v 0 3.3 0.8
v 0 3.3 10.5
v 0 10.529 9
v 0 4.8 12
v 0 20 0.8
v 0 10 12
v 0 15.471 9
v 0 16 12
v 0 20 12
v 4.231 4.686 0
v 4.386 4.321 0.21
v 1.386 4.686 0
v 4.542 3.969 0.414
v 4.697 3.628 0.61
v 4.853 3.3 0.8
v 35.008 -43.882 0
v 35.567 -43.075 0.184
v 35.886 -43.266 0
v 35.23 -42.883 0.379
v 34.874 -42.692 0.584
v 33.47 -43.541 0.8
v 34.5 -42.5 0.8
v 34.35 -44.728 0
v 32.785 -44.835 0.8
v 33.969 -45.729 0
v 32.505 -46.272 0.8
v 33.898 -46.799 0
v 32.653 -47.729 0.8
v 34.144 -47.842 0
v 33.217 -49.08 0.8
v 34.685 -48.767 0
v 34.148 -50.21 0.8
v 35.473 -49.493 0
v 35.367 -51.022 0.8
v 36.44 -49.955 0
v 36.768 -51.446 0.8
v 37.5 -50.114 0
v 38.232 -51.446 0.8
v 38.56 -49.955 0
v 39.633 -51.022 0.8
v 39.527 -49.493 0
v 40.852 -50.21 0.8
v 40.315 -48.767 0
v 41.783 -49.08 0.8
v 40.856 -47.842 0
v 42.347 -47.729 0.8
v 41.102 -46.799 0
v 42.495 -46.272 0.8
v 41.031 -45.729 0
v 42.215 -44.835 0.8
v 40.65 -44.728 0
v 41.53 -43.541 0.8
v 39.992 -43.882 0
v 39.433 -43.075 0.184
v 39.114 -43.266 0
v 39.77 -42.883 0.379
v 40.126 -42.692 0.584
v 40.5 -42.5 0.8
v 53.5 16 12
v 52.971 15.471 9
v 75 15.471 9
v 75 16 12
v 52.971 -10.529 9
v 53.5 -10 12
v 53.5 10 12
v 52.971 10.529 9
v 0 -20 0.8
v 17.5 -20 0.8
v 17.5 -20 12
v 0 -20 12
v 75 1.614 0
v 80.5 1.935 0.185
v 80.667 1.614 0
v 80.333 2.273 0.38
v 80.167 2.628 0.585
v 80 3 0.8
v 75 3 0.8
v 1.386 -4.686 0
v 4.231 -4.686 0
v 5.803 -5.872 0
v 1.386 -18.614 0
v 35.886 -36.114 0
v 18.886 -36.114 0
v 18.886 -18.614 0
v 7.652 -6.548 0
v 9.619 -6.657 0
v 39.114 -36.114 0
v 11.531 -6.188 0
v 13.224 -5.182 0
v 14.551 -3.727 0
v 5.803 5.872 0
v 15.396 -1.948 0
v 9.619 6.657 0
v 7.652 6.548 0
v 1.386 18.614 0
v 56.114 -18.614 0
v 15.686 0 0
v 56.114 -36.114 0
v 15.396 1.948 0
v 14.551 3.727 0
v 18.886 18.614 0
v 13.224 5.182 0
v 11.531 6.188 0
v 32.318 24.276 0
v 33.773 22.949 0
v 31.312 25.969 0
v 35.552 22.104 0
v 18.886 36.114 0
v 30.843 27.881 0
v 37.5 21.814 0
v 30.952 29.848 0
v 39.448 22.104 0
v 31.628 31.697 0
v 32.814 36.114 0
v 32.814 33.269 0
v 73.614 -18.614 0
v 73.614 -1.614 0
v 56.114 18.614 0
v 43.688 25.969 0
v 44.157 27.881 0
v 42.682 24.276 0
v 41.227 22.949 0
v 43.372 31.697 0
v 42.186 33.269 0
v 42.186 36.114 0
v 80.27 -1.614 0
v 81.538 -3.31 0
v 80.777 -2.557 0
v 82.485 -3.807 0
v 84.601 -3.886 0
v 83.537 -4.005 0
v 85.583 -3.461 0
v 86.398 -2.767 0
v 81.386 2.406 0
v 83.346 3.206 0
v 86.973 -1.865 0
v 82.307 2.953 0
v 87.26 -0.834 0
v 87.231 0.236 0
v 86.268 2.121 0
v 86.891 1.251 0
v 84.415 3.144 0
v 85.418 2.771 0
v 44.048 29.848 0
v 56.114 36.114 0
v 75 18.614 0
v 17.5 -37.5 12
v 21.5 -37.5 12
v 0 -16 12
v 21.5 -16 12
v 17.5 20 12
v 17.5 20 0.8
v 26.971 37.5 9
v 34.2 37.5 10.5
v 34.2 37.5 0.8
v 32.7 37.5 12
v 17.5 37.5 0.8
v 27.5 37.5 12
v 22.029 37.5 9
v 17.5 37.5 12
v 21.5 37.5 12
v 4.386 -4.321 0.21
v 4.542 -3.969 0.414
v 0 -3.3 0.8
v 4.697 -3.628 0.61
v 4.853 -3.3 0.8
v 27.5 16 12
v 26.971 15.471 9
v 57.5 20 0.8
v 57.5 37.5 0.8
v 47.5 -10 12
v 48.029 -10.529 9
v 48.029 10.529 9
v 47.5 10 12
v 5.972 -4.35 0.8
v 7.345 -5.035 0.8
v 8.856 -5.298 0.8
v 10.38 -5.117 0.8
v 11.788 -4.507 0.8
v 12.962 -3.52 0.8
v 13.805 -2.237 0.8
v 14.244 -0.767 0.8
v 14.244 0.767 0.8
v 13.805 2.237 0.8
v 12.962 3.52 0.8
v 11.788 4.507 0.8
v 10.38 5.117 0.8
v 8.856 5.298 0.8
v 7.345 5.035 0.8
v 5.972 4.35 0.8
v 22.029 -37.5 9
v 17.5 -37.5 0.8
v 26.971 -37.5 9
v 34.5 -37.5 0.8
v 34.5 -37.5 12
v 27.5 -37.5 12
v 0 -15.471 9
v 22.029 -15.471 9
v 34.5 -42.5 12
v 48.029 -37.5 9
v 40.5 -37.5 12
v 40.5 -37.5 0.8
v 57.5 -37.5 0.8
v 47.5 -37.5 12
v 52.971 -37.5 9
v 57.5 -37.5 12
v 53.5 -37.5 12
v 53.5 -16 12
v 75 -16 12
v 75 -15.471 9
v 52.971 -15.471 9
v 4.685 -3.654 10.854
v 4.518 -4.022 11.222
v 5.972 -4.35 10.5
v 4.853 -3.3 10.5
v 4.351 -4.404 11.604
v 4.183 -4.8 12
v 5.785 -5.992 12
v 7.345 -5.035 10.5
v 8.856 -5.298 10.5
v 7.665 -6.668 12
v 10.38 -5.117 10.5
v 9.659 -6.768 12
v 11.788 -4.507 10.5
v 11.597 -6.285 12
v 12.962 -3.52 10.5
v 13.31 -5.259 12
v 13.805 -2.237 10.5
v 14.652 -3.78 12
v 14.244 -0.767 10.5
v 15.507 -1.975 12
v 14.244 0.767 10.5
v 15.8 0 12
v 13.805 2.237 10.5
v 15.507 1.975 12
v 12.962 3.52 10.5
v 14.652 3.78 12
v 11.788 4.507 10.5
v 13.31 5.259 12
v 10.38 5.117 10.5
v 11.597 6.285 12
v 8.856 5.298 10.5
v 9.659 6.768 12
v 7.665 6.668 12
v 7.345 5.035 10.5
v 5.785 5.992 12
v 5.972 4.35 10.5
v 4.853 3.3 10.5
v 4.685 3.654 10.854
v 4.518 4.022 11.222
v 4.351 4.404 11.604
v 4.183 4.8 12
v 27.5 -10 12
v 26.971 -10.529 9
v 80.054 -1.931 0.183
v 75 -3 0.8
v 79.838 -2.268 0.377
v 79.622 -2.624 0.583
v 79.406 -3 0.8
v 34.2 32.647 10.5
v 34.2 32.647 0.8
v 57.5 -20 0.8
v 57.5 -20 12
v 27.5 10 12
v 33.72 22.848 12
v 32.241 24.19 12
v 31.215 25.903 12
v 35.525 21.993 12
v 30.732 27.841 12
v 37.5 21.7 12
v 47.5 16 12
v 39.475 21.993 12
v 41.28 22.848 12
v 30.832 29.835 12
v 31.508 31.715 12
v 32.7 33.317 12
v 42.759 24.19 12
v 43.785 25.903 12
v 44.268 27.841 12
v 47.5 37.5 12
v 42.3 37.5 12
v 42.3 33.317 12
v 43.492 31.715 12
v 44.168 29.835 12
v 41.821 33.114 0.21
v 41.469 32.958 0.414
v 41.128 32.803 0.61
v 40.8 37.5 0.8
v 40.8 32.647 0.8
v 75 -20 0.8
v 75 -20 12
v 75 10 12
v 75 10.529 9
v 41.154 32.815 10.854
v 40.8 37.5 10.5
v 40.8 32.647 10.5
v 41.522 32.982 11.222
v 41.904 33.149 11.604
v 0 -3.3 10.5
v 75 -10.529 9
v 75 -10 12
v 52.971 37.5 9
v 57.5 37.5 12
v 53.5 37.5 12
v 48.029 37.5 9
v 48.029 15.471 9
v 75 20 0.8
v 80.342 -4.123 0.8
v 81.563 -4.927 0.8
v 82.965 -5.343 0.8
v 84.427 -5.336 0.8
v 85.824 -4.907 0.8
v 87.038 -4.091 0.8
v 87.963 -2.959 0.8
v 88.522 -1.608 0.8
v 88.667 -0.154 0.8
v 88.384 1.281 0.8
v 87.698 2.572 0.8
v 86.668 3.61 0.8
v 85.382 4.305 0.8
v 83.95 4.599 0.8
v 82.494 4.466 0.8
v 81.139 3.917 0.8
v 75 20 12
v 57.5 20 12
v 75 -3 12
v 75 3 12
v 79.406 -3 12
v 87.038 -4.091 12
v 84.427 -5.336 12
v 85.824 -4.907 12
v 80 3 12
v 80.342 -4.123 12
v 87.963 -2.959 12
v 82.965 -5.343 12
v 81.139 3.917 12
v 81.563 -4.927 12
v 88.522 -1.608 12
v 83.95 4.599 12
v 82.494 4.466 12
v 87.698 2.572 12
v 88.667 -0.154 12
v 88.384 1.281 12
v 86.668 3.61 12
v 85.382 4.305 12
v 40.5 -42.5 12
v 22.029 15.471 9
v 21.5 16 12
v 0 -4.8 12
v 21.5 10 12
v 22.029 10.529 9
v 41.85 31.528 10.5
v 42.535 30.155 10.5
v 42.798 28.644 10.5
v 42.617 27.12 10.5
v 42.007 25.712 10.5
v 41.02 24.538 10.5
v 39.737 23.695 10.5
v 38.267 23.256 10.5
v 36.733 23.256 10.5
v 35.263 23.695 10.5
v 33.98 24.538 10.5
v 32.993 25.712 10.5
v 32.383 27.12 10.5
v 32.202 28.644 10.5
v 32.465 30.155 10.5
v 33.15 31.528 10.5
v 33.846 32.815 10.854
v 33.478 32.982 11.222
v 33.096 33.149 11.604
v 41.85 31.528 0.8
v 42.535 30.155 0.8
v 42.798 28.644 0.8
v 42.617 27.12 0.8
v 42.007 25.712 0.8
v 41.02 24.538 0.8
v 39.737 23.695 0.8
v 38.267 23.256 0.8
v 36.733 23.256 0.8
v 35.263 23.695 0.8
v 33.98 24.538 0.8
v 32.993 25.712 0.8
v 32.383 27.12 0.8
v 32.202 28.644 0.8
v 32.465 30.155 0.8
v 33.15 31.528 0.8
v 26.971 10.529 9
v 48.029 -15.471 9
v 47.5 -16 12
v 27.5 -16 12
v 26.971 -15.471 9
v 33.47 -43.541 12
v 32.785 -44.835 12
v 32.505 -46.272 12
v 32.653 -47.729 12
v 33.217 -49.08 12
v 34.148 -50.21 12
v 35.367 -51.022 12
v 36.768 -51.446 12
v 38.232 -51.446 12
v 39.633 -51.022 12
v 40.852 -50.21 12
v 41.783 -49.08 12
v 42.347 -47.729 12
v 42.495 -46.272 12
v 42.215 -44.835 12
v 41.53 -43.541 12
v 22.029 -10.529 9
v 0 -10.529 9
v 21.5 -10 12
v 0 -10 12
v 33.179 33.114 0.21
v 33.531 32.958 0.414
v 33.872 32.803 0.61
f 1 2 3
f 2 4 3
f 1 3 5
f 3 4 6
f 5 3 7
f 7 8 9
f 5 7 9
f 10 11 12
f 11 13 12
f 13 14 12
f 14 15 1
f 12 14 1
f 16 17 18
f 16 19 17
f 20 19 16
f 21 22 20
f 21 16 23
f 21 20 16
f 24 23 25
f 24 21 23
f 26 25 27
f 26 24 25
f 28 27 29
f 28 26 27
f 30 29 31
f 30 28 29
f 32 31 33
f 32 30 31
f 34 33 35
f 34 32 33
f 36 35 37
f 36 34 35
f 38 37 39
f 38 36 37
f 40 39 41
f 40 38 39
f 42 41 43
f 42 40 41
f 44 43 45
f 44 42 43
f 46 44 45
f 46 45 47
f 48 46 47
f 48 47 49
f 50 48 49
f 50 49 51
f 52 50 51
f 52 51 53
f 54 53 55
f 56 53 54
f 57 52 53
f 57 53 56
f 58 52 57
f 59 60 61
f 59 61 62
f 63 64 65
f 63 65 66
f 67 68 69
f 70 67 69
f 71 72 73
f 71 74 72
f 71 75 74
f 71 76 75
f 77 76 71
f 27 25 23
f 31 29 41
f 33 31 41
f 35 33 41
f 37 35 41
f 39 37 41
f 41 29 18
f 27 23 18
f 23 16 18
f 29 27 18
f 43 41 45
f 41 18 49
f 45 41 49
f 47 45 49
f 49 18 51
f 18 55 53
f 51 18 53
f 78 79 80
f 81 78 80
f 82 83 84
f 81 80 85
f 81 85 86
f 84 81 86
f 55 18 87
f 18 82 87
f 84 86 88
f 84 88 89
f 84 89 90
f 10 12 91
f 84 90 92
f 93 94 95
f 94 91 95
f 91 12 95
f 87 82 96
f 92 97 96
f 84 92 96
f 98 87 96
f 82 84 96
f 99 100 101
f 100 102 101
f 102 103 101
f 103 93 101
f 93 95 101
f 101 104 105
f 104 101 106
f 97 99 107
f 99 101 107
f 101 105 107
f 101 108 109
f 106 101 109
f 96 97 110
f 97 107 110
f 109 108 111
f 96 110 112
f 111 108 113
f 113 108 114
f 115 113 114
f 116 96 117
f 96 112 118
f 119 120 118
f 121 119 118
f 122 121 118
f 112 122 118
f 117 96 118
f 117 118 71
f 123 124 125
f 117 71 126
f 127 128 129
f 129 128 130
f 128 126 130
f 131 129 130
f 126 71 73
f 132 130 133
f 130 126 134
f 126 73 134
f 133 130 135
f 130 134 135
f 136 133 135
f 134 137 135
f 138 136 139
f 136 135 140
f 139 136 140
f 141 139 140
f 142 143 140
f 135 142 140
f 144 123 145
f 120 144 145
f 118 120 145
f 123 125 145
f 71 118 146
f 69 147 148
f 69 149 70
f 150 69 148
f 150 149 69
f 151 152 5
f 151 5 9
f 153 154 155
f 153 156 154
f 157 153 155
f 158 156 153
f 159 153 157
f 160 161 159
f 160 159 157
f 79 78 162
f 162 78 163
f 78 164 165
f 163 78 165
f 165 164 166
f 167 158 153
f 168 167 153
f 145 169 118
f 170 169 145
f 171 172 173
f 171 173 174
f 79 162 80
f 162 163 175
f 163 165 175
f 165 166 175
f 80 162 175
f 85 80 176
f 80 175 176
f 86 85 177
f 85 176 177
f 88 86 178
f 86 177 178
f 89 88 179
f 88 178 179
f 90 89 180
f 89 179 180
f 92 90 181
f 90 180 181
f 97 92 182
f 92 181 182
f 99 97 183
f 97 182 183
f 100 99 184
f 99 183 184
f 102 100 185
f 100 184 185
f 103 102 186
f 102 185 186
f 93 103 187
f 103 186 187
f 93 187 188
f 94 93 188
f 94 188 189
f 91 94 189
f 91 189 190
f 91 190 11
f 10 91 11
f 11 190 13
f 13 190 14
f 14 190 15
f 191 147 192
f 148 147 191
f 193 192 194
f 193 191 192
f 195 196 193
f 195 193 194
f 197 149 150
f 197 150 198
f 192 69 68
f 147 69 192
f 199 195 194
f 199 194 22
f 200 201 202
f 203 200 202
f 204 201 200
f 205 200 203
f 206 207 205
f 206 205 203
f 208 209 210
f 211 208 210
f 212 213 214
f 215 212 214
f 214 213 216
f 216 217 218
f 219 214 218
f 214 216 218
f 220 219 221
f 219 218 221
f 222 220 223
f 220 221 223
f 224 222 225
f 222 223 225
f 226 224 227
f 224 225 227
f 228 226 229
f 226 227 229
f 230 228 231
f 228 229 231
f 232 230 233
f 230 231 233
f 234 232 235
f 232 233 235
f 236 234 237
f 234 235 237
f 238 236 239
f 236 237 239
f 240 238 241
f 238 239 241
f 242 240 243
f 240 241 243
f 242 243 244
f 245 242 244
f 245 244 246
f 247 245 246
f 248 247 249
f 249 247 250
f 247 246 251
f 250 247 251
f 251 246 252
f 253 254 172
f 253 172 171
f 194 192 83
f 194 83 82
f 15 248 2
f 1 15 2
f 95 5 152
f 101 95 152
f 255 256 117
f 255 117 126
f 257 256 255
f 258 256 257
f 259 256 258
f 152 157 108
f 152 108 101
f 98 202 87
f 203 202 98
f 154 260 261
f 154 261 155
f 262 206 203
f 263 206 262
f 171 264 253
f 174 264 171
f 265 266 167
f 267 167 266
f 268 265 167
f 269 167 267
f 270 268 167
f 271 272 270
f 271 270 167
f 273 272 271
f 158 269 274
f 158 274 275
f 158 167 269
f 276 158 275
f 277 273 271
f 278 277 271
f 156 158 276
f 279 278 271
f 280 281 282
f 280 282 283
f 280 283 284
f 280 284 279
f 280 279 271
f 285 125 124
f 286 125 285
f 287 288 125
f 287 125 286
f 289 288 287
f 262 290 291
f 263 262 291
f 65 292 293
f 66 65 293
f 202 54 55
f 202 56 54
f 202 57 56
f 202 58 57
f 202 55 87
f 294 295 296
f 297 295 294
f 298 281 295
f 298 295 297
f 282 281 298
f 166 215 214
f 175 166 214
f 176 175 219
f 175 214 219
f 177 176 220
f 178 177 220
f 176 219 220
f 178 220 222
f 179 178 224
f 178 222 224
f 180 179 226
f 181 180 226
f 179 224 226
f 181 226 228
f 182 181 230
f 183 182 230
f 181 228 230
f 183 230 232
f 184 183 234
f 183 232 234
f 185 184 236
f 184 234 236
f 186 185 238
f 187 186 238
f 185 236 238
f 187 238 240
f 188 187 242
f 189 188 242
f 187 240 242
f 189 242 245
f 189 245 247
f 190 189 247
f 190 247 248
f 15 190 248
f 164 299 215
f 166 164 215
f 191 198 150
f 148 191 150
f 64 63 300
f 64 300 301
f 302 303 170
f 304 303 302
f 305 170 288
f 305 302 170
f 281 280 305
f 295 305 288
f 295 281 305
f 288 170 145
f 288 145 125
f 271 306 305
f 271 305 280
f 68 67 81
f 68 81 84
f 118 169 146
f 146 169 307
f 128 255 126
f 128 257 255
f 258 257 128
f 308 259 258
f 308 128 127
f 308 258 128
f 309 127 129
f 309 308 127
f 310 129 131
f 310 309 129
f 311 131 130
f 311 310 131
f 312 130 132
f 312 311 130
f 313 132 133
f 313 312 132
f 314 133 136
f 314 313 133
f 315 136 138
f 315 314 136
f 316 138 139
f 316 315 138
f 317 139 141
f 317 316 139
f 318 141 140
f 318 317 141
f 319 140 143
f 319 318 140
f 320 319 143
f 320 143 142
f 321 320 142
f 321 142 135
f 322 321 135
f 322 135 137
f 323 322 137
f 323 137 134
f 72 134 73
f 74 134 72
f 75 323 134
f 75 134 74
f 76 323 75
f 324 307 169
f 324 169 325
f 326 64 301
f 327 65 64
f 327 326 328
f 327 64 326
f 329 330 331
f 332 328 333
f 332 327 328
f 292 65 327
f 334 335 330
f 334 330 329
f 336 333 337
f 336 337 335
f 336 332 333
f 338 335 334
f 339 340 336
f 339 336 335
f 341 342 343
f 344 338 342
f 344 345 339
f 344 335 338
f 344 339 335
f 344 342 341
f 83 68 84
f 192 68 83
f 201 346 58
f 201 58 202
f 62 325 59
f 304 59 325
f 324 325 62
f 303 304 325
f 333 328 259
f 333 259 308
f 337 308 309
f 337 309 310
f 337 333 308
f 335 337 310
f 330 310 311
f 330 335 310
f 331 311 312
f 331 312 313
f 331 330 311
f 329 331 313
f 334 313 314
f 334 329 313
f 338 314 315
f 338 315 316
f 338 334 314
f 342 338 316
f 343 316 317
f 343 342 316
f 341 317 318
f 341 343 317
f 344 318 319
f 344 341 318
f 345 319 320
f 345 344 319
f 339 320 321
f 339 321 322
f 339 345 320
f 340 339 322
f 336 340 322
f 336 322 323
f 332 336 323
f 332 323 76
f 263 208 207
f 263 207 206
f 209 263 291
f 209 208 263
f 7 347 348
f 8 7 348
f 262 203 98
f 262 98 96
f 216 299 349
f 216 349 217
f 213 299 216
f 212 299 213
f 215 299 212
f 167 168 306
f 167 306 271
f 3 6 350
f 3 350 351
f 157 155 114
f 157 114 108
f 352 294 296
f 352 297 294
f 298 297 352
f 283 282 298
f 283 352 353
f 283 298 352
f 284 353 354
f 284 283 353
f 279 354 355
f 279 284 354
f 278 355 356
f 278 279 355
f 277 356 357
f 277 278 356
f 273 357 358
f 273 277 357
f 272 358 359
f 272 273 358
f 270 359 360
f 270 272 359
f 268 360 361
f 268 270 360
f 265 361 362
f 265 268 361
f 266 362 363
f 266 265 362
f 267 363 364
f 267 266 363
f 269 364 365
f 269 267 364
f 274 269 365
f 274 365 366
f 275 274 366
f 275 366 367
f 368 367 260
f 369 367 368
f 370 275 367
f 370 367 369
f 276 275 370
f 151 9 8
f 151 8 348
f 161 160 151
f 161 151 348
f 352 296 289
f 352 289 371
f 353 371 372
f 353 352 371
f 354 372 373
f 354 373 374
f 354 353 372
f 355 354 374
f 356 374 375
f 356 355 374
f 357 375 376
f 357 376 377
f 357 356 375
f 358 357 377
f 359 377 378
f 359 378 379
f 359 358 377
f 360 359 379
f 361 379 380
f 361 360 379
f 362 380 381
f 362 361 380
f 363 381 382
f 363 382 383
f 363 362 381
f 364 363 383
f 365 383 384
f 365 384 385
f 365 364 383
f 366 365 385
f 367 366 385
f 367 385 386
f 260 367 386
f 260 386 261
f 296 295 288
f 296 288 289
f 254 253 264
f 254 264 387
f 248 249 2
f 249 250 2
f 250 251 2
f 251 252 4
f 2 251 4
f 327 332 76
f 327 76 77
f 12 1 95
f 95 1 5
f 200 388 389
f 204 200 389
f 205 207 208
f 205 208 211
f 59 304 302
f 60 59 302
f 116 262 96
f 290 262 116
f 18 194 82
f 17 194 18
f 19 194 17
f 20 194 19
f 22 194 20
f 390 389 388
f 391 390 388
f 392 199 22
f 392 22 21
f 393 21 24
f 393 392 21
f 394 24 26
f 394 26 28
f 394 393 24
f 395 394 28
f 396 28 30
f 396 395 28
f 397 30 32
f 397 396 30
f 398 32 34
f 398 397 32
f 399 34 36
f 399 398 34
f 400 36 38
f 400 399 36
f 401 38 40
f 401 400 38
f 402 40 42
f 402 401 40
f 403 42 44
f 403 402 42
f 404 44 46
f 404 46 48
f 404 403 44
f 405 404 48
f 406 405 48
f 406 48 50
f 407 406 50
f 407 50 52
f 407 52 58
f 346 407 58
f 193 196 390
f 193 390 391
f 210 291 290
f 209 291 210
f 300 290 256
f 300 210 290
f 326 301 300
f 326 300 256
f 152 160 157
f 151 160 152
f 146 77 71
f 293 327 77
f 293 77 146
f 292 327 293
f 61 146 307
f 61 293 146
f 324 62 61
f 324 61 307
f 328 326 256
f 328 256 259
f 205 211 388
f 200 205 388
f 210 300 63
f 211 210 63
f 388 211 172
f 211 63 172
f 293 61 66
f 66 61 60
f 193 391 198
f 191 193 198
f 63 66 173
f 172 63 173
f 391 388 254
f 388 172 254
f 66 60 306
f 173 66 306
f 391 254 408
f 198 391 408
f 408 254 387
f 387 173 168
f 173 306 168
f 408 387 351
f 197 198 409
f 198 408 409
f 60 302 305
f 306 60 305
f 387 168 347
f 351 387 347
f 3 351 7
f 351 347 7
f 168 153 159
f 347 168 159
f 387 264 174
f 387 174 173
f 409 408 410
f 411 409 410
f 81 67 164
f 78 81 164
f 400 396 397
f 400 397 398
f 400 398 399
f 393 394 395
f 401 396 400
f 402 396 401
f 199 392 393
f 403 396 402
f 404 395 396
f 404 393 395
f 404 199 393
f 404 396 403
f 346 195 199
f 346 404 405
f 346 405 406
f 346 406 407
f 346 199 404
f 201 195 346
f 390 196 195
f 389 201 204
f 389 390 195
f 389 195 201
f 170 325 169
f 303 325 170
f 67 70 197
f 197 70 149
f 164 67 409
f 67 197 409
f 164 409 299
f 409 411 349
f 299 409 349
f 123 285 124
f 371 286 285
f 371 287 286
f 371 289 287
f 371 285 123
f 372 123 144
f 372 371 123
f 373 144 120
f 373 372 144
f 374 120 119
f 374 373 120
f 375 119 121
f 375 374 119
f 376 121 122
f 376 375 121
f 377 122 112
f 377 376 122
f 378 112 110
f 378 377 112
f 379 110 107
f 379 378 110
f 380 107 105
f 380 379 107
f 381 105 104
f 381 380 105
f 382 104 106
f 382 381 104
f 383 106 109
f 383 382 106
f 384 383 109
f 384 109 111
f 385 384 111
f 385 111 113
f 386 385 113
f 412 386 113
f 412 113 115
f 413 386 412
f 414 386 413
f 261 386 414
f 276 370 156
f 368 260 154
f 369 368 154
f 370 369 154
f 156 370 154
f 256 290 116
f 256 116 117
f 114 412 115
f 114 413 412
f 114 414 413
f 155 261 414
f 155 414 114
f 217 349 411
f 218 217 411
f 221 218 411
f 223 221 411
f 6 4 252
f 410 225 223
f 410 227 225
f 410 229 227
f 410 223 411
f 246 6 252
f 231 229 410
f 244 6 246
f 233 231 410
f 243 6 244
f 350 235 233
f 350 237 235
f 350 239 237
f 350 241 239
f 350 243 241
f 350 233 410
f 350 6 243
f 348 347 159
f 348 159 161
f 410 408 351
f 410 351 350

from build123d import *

# Parameters (mm, degrees)
F0_W      = 40
F0_H      = 12
F1_DEPTH  = 75
F3_DEPTH  = 12
F5_DEPTH  = 12
F7_DEPTH  = 75
F9_DEPTH  = 75
F10_SIZE2 = 0.8
F10_SIZE  = 1.3856406461
F11_SIZE  = 1.5


with BuildPart() as f1:
    # F0 (on Right) → F1 (new body)
    with BuildSketch(Plane.YZ):
        with Locations((0, 6)):
            Rectangle(F0_W, F0_H)
    extrude(amount=F1_DEPTH)

    # F2 (on face) → F3 (join)
    with BuildSketch(Plane.XY.offset(12)):
        with BuildLine():
            Line((40.5, -37.5), (57.5, -37.5))
            Line((57.5, -37.5), (57.5, 37.5))
            Line((57.5, 37.5), (40.8, 37.5))
            Line((40.8, 37.5), (40.8, 32.6472882707))
            ThreePointArc((40.8, 32.6472882707), (37.5, 23.2), (34.2, 32.6472882707))
            Line((34.2, 32.6472882707), (34.2, 37.5))
            Line((34.2, 37.5), (17.5, 37.5))
            Line((17.5, 37.5), (17.5, -37.5))
            Line((17.5, -37.5), (34.5, -37.5))
            Line((34.5, -37.5), (34.5, -42.5))
            ThreePointArc((34.5, -42.5), (37.5, -51.5), (40.5, -42.5))
            Line((40.5, -42.5), (40.5, -37.5))
        make_face()
        with BuildLine():
            Line((80, 3), (75, 3))
            Line((75, 3), (75, -3))
            Line((75, -3), (79.4055112535, -3))
            ThreePointArc((79.4055112535, -3), (88.6478954729, -0.8862974958), (80, 3))
        make_face()
    extrude(amount=-F3_DEPTH)

    # F4 (on face) → F5 (cut)
    with BuildSketch(Plane.XY.offset(12)):
        with BuildLine():
            Line((0, 3.3), (0, 3))
            Line((0, 3), (0, -3))
            Line((0, -3), (0, -3.3))
            Line((0, -3.3), (4.8527117293, -3.3))
            ThreePointArc((4.8527117293, -3.3), (14.3, 0), (4.8527117293, 3.3))
            Line((4.8527117293, 3.3), (0, 3.3))
        make_face()
    extrude(amount=-F5_DEPTH, mode=Mode.SUBTRACT)

    # F6 (on face) → F7 (cut)
    with BuildSketch(Plane.YZ.offset(75)):
        Polygon((-10, 12), (-16, 12), (-15.4710190579, 9), (-10.5289809421, 9), align=None)
        Polygon((15.4710190579, 9), (16, 12), (10, 12), (10.5289809421, 9), align=None)
    extrude(amount=-F7_DEPTH, mode=Mode.SUBTRACT)

    # F8 (on face) → F9 (cut)
    with BuildSketch(Plane(origin=(0, 37.5, 0), x_dir=(-1, 0, 0), z_dir=(0, 1, 0))):
        Polygon((-47.5, 12), (-53.5, 12), (-52.9710190579, 9), (-48.0289809421, 9), align=None)
        Polygon((-21.5, 12), (-27.5, 12), (-26.9710190579, 9), (-22.0289809421, 9), align=None)
    extrude(amount=-F9_DEPTH, mode=Mode.SUBTRACT)

    # F10
    f10_edges = [f1.edges().sort_by_distance(p)[0] for p in [
        (37.5, -51.5, 0),
        (40.5, -40, 0),
        (49, -37.5, 0),
        (66.25, -20, 0),
        (34.5, -40, 0),
        (75, -11.5, 0),
        (57.5, -28.75, 0),
        (77.5, 3, 0),
        (77.202756, -3, 0),
        (88.647895, -0.886297, 0),
        (66.25, 20, 0),
        (57.5, 28.75, 0),
        (49.15, 37.5, 0),
        (40.8, 35.073644, 0),
        (37.5, 23.2, 0),
        (34.2, 35.073644, 0),
        (25.85, 37.5, 0),
        (17.5, 28.75, 0),
        (8.75, 20, 0),
        (2.426356, -3.3, 0),
        (14.3, 0, 0),
        (2.426356, 3.3, 0),
        (0, 11.65, 0),
        (0, -11.65, 0),
        (8.75, -20, 0),
        (17.5, -28.75, 0),
        (26, -37.5, 0),
    ]]
    f10_side = f1.faces().sort_by_distance((39.337765, -1.867927, 0))[0]
    chamfer(f10_edges, length=F10_SIZE, length2=F10_SIZE2, reference=f10_side)

    # F11
    f11_edges = [f1.edges().sort_by_distance(p)[0] for p in [
        (2.426356, -3.3, 12),
        (14.3, 0, 12),
        (2.426356, 3.3, 12),
        (37.5, 23.2, 12),
        (34.2, 35.073644, 12),
        (40.8, 35.073644, 12),
    ]]
    chamfer(f11_edges, length=F11_SIZE)


solid = f1.part
